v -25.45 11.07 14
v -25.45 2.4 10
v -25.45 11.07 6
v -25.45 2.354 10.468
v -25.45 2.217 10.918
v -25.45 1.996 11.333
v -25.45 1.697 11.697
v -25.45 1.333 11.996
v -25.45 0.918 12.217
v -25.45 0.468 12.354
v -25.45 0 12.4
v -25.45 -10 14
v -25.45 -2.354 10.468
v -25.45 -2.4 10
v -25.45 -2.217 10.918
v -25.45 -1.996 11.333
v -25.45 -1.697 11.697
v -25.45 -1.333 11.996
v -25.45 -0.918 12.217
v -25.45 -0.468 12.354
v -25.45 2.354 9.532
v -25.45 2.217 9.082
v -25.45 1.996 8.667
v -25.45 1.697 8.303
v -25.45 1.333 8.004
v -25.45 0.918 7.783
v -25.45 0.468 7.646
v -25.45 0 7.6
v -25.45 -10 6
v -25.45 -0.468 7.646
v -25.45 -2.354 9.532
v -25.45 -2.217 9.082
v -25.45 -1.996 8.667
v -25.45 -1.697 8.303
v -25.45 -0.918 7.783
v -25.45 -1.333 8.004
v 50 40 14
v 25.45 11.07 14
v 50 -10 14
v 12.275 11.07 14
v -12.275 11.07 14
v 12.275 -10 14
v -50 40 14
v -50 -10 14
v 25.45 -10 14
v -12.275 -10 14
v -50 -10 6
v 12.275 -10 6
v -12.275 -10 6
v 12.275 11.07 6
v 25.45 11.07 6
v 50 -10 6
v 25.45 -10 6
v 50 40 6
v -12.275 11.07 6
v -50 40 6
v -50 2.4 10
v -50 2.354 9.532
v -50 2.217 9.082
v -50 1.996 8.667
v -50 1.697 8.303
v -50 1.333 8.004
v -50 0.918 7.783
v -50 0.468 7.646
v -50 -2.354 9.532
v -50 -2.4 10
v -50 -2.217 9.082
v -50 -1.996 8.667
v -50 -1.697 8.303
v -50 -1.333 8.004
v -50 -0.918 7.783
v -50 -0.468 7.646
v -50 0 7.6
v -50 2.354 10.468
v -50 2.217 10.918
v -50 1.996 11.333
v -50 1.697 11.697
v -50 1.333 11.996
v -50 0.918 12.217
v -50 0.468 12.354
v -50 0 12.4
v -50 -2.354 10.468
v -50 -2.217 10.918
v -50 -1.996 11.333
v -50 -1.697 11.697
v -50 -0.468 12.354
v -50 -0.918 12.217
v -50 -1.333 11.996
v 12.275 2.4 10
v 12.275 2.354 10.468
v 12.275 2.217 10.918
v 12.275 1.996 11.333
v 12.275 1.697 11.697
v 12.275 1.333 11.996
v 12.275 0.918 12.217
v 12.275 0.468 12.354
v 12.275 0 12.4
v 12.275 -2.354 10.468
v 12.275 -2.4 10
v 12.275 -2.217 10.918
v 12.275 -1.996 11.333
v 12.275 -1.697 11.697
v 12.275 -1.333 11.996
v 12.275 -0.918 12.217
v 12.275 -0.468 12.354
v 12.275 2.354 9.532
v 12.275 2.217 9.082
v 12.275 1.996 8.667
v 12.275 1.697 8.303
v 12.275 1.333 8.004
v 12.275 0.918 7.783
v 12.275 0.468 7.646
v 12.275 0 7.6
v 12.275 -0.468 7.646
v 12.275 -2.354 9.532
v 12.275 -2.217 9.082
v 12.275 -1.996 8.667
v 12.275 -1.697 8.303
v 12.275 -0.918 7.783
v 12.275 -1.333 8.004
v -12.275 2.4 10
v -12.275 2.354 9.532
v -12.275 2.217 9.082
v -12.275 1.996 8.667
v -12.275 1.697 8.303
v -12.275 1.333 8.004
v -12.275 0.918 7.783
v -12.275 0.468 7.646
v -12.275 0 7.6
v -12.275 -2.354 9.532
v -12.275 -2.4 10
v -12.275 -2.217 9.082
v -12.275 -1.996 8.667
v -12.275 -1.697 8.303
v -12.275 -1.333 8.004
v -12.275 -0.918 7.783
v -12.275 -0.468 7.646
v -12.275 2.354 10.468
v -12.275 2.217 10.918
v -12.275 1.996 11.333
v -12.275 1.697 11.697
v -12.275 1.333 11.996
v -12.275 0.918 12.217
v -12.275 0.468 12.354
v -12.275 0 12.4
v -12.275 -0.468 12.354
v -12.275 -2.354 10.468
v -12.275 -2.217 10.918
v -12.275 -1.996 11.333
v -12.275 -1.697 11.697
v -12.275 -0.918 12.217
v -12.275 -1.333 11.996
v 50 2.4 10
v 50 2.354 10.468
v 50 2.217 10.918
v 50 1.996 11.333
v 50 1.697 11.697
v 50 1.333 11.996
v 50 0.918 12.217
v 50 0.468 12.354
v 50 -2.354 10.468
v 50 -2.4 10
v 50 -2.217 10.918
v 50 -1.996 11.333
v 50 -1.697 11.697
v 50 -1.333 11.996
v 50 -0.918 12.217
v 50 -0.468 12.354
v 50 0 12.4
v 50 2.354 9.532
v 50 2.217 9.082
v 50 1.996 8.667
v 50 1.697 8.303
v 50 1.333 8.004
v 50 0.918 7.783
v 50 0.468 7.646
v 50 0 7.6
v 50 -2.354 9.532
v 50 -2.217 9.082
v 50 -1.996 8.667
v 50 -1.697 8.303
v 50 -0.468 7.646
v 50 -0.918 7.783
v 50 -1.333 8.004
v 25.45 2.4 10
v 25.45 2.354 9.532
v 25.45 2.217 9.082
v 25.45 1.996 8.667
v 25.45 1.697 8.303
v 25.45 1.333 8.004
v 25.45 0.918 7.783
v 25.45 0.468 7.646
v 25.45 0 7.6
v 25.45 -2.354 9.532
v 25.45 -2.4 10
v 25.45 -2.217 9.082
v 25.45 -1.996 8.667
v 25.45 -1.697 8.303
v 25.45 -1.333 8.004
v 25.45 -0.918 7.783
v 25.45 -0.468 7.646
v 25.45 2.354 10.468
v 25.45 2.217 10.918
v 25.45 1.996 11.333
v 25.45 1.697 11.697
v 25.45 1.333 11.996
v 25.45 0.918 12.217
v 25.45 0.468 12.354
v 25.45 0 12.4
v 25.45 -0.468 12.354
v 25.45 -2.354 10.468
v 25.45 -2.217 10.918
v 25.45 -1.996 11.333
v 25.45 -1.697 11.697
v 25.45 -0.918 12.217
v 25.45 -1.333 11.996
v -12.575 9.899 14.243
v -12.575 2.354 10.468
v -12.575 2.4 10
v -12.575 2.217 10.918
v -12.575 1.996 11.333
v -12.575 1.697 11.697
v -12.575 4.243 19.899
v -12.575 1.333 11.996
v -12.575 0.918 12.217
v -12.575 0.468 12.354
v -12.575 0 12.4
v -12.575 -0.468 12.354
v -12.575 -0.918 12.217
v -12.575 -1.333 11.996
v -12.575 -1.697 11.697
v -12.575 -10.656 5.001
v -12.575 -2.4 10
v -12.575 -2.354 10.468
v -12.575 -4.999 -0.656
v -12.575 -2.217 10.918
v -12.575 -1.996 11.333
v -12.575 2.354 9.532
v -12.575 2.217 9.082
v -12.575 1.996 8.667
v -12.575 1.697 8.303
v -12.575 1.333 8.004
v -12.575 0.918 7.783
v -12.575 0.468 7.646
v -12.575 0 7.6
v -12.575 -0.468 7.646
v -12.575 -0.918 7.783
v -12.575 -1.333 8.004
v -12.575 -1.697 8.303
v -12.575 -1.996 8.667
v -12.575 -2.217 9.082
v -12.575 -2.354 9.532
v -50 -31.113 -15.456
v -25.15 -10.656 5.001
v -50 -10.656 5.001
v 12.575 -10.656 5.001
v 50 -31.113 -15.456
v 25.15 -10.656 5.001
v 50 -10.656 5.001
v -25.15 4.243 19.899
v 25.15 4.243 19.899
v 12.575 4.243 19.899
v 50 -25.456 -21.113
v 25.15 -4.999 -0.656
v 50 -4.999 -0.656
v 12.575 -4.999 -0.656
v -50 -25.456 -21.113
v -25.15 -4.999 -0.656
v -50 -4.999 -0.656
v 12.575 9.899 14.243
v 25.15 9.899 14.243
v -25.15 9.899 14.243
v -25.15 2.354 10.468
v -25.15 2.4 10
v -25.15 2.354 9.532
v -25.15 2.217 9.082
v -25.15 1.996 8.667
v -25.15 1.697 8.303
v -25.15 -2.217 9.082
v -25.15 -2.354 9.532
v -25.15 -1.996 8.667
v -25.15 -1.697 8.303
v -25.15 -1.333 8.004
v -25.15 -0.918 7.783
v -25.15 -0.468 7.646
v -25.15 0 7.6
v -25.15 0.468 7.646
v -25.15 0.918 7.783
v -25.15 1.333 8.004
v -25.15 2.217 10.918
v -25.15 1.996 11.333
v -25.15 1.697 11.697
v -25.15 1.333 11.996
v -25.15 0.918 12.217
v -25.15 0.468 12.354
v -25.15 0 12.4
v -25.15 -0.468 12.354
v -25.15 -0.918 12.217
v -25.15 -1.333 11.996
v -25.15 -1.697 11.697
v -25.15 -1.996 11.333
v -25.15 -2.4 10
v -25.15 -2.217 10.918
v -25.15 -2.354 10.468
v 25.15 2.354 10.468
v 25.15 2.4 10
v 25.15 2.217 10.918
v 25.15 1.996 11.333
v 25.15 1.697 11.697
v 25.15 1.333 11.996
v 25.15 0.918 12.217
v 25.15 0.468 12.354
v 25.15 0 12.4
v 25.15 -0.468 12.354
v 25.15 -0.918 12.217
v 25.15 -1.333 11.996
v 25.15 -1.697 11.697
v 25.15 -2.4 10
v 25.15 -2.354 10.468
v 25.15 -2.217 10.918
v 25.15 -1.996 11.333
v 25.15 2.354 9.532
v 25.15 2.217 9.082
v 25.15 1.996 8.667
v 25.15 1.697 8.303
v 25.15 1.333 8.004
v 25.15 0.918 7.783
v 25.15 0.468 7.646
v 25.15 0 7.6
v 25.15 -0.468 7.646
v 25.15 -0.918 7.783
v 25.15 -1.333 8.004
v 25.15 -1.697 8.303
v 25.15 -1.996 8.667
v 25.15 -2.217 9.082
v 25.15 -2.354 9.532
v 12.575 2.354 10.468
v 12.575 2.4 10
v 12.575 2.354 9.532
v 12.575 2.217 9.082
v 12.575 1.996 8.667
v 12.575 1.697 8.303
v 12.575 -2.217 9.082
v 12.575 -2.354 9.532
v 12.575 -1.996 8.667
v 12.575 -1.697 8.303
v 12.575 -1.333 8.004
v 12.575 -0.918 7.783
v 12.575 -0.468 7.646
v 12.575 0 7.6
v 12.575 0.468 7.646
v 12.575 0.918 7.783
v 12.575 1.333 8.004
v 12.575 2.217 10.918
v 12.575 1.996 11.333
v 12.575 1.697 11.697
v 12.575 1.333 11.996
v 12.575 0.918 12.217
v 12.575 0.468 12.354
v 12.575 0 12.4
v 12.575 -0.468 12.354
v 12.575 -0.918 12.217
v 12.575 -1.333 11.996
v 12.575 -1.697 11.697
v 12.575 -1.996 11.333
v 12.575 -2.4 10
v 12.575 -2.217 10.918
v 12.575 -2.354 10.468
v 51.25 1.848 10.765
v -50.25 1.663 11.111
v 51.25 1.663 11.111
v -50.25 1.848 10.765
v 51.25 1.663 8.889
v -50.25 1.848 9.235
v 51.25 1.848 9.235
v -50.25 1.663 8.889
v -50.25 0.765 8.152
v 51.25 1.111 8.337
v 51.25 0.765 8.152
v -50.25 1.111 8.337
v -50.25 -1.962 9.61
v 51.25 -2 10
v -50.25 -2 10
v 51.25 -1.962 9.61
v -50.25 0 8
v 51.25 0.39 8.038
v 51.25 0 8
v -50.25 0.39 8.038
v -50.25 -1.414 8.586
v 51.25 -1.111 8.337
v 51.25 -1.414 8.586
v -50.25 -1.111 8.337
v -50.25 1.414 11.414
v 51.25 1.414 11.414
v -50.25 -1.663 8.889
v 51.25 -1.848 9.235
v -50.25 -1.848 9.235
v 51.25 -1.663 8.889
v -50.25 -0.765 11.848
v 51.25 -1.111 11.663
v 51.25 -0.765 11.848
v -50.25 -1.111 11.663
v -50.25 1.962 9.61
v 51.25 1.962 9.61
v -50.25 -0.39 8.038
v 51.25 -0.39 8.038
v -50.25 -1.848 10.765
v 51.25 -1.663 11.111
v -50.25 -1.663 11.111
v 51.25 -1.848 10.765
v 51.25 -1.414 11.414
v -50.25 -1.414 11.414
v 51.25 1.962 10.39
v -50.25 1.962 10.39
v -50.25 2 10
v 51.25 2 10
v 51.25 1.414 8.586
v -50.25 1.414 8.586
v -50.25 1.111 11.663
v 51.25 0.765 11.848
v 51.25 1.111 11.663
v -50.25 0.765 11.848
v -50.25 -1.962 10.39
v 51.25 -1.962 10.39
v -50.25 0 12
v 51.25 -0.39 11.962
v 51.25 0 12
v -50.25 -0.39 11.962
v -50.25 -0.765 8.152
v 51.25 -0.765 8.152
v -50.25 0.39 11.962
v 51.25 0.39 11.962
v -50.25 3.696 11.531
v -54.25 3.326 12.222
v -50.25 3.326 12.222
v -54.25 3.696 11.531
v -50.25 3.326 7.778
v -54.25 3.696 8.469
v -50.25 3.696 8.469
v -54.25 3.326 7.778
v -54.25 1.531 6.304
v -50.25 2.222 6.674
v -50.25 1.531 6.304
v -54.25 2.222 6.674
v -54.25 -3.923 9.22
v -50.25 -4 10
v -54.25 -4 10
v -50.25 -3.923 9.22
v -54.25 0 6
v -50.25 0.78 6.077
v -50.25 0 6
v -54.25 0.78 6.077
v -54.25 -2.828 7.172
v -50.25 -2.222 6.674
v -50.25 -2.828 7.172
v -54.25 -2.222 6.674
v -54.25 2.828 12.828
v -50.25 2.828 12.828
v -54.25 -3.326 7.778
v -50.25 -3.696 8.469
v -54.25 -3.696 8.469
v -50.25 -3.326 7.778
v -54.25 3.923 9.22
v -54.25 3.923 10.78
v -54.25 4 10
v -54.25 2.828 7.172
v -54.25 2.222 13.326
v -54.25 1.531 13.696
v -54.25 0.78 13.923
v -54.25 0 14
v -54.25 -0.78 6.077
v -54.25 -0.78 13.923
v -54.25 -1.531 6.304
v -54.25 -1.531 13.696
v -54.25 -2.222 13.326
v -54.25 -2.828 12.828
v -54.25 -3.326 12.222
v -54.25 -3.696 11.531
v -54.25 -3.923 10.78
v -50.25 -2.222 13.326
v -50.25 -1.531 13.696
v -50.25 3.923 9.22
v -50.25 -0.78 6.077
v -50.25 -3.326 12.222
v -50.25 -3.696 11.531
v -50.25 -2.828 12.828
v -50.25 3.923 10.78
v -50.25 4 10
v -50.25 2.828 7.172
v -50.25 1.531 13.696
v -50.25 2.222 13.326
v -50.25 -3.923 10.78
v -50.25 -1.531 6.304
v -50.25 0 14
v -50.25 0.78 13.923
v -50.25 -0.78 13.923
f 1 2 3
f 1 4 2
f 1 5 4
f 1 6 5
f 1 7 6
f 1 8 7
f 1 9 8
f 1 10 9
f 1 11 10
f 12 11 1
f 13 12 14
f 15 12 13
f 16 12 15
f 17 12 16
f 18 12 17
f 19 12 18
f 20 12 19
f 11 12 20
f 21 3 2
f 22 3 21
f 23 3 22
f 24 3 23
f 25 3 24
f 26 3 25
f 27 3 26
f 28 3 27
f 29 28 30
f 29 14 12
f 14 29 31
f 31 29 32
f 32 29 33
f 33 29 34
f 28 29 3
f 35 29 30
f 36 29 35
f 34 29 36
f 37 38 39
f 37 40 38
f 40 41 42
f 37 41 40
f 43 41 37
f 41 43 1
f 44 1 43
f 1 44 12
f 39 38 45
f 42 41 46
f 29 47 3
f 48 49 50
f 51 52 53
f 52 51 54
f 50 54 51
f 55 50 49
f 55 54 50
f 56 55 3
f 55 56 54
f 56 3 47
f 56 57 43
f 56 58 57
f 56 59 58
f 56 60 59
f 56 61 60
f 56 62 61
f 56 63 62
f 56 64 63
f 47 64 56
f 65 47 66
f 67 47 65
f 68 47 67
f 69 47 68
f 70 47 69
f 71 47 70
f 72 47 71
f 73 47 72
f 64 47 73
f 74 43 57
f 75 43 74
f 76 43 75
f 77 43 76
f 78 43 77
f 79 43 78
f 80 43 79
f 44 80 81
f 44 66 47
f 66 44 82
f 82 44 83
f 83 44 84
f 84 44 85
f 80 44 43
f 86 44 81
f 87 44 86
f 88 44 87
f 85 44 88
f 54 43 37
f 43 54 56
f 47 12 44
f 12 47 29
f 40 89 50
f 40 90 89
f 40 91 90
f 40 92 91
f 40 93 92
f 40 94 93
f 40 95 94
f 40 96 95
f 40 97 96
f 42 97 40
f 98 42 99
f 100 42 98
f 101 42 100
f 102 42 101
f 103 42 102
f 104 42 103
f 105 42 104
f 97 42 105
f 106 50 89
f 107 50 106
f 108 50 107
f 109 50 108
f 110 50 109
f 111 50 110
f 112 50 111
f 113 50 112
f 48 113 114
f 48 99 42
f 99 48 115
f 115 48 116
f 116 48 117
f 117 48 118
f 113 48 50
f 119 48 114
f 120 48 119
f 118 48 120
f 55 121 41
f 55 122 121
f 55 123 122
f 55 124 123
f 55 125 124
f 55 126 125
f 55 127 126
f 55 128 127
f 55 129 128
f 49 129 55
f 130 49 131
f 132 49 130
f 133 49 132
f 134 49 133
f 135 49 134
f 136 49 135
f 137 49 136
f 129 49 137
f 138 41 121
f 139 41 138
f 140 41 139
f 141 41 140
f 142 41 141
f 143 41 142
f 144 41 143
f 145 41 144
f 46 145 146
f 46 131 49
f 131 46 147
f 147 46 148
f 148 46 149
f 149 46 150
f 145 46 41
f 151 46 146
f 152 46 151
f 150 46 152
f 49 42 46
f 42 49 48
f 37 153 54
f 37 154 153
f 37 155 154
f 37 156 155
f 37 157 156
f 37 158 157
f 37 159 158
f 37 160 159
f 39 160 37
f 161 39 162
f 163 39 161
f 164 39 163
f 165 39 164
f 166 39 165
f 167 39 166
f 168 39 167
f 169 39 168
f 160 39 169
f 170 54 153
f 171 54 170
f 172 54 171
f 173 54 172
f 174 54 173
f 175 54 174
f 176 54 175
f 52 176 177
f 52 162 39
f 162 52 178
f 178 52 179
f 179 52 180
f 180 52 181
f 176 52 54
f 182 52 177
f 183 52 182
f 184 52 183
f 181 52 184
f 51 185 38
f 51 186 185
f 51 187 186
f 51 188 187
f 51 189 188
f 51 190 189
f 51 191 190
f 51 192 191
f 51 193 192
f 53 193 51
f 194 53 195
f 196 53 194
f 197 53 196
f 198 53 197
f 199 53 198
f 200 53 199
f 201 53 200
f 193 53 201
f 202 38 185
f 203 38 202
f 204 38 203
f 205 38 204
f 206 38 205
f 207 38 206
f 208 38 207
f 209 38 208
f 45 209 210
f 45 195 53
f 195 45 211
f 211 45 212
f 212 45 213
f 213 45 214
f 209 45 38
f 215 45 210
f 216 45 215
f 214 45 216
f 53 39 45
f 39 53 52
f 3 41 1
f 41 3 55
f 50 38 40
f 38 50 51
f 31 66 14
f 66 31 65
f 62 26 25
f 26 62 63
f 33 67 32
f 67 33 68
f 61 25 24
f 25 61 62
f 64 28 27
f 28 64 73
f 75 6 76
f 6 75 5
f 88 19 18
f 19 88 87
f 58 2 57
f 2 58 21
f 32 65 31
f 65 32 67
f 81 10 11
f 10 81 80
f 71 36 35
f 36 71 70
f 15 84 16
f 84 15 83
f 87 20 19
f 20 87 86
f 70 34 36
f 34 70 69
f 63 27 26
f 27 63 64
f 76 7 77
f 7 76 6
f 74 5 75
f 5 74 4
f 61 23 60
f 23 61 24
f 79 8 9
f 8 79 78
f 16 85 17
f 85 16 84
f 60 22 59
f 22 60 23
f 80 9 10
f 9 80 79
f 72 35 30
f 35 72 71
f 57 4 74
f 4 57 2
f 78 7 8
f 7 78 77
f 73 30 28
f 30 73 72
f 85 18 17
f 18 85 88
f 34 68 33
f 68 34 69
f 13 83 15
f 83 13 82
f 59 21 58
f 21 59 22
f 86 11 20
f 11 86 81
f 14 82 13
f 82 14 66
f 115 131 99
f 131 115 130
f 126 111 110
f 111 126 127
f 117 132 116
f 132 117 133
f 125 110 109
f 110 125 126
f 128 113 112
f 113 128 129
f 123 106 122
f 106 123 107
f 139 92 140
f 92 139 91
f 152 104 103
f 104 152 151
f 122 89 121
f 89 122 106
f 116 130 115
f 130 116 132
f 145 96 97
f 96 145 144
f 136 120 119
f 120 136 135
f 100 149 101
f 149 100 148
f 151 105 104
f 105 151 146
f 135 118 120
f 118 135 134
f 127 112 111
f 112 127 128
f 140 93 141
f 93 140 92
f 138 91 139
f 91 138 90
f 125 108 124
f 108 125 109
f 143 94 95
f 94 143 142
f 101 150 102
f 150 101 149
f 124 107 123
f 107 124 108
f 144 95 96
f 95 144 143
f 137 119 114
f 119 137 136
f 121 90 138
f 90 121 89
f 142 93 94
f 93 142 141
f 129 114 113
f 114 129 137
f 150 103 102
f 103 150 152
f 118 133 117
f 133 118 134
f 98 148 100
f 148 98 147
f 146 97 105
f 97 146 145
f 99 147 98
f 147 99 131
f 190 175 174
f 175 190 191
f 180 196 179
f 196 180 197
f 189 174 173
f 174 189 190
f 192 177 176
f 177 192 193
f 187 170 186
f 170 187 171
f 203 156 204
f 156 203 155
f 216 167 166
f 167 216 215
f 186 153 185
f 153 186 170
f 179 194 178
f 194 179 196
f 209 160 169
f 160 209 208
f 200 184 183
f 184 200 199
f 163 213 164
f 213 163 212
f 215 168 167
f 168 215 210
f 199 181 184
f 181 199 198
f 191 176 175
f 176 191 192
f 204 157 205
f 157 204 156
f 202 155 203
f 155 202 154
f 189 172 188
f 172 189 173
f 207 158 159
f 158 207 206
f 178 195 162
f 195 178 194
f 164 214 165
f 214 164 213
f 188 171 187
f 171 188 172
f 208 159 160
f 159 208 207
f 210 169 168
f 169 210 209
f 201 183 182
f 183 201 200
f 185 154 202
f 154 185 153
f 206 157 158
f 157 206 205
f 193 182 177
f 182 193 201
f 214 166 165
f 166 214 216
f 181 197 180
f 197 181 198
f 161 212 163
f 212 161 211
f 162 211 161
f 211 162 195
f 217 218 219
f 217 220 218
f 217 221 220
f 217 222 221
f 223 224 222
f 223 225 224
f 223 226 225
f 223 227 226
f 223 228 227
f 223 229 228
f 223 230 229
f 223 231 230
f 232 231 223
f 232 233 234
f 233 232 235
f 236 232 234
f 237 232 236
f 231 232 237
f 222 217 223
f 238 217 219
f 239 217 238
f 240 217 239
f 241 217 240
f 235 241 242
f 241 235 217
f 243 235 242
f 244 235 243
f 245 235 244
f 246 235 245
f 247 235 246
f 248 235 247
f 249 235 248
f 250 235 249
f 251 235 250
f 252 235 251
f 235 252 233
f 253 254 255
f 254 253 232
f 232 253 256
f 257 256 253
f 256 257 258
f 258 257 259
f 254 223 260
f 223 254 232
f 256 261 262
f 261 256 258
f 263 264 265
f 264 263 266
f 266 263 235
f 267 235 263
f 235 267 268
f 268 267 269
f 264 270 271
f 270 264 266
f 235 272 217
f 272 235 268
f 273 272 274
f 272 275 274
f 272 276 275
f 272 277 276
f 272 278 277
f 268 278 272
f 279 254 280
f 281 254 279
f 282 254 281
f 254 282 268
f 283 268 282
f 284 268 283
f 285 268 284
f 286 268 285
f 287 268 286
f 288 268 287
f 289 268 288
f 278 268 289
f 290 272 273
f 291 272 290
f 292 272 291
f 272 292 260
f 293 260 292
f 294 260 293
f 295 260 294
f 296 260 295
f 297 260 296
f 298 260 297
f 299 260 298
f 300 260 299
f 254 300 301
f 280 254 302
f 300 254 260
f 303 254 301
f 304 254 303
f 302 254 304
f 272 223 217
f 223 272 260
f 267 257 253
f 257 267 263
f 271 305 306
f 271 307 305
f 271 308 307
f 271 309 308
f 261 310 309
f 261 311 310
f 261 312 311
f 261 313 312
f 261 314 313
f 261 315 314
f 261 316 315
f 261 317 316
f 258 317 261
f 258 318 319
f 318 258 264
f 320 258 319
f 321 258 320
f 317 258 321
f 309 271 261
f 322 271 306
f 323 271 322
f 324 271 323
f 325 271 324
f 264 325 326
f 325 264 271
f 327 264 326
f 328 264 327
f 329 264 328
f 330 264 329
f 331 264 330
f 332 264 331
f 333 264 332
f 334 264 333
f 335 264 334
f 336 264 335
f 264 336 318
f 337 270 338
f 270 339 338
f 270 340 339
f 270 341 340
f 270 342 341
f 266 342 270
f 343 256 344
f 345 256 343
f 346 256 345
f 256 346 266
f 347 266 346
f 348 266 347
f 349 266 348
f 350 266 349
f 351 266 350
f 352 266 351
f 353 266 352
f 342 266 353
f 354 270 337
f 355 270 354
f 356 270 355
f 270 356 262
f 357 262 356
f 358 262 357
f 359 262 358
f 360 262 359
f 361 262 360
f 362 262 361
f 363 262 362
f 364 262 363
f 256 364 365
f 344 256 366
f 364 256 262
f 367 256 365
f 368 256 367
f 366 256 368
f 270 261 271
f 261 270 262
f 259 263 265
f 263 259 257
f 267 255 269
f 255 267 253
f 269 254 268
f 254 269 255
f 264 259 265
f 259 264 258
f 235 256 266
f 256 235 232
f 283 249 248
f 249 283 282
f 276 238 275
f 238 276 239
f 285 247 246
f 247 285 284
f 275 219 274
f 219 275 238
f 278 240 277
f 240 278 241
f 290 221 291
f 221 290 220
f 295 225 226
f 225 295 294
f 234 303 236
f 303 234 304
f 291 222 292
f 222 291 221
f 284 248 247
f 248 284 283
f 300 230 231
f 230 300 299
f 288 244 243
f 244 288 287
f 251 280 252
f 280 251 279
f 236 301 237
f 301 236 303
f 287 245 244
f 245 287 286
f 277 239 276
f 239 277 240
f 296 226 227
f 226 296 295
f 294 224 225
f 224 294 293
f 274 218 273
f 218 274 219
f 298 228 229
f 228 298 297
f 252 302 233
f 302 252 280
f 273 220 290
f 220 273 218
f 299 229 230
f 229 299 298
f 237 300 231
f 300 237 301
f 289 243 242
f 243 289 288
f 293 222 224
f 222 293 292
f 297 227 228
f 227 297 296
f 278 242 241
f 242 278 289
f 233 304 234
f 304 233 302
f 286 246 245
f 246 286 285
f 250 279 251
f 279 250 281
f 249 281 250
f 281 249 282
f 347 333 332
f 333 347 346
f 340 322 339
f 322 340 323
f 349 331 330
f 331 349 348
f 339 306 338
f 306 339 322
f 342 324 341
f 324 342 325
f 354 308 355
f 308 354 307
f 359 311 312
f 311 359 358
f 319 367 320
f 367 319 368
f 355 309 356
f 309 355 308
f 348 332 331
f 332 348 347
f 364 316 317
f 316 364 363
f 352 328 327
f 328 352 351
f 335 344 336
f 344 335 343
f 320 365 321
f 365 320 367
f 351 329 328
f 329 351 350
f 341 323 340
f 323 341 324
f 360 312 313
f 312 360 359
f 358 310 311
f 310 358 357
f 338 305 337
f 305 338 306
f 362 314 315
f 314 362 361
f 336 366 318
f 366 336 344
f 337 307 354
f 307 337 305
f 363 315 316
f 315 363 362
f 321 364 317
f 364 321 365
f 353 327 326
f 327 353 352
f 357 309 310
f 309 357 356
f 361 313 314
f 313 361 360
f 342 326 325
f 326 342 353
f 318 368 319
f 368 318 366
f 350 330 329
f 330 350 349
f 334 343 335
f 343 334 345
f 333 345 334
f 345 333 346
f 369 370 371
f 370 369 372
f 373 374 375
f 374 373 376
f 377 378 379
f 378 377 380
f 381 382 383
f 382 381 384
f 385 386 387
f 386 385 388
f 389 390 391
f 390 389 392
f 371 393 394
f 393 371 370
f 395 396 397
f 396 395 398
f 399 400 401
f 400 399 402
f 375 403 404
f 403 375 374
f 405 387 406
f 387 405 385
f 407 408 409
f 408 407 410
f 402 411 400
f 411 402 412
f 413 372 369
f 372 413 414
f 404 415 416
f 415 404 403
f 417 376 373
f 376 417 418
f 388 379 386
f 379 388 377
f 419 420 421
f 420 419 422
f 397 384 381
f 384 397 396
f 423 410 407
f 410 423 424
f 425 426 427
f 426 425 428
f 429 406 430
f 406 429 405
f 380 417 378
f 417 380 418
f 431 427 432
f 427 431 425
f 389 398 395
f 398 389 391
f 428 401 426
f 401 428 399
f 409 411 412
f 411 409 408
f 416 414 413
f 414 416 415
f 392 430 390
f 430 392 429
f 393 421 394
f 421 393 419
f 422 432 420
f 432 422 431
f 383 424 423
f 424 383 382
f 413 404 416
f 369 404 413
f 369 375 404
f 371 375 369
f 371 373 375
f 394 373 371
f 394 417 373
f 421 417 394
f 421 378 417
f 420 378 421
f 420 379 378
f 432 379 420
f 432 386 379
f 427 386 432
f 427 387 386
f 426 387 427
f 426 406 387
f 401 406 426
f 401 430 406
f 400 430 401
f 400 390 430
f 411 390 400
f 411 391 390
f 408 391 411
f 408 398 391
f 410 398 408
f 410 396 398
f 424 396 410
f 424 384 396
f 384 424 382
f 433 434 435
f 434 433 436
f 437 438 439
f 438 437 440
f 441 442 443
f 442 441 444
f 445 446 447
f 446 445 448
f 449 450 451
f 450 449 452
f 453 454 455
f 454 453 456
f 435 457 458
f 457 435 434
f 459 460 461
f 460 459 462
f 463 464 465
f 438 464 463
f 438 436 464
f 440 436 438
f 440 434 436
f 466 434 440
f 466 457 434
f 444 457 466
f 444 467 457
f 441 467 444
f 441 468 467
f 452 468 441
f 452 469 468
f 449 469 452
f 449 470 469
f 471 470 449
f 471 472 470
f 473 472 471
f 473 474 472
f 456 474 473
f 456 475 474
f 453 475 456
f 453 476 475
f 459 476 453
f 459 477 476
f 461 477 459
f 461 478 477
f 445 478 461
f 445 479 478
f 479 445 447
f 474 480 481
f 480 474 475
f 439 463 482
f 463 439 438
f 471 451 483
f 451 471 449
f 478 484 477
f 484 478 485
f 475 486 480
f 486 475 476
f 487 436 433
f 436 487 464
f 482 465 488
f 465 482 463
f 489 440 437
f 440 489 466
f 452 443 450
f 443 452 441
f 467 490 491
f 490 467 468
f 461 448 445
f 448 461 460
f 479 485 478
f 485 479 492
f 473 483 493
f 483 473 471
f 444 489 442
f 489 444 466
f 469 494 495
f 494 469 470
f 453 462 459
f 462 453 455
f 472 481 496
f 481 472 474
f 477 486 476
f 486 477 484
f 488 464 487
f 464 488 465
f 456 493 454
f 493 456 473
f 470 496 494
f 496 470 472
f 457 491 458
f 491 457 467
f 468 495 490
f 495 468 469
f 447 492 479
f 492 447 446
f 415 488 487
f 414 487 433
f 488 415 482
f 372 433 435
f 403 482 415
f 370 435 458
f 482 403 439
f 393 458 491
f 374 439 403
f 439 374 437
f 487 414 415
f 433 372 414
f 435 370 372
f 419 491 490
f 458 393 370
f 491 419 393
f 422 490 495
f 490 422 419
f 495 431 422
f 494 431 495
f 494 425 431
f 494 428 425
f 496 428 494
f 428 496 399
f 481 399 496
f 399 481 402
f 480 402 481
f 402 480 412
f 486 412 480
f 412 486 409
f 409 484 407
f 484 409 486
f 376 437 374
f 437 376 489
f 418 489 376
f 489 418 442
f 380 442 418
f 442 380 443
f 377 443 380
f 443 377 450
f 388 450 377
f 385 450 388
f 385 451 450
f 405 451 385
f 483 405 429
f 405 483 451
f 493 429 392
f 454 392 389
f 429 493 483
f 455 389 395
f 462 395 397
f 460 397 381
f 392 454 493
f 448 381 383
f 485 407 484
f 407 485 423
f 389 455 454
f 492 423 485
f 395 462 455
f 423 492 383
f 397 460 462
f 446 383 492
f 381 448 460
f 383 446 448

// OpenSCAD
$fn = 32;

// ------------------------------------------------------------------------
// Butt hinge: hinge 100 mm, leaf swung 45 deg
// Every part is its own module, assembly() places every instance.
// ------------------------------------------------------------------------

// --- part 1 ---
module hinge_base() {
  difference() {
    union() {
      translate([-50, -10, -4]) cube([24.55, 50, 8]);
      translate([-12.275, -10, -4]) cube([24.55, 50, 8]);
      translate([25.45, -10, -4]) cube([24.55, 50, 8]);
      translate([-50, 11.07, -4]) cube([100, 28.93, 8]);
    }
    translate([-37.725, 0, 0]) rotate([0, 90, 0]) cylinder(h = 26.55, d = 4.8, center = true);
    translate([0, 0, 0]) rotate([0, 90, 0]) cylinder(h = 26.55, d = 4.8, center = true);
    translate([37.725, 0, 0]) rotate([0, 90, 0]) cylinder(h = 26.55, d = 4.8, center = true);
  }
}

// --- part 2 ---
module hinge_mover() {
  difference() {
    union() {
      translate([-25.15, -40, -4]) cube([12.575, 50, 8]);
      translate([12.575, -40, -4]) cube([12.575, 50, 8]);
      translate([-50, -40, -4]) cube([100, 28.93, 8]);
    }
    translate([-18.863, 0, 0]) rotate([0, 90, 0]) cylinder(h = 14.575, d = 4.8, center = true);
    translate([18.863, 0, 0]) rotate([0, 90, 0]) cylinder(h = 14.575, d = 4.8, center = true);
  }
}

// --- part 3 ---
module hinge_pin() {
  rotate([0, 90, 0]) cylinder(h = 102.5, d = 4, center = true);
  translate([-54.25, 0, 0]) rotate([0, 90, 0]) cylinder(h = 4, d = 8);
}

// --- assembly ---
module assembly() {
  color([0.80, 0.24, 0.20]) translate([0, 0, 10]) rotate([0, 0, 0]) hinge_base();
  color([0.20, 0.45, 0.75]) translate([0, 0, 10]) rotate([45, 0, 0]) hinge_mover();
  color([0.25, 0.62, 0.32]) translate([0, 0, 10]) rotate([0, 0, 0]) hinge_pin();
}

assembly();
